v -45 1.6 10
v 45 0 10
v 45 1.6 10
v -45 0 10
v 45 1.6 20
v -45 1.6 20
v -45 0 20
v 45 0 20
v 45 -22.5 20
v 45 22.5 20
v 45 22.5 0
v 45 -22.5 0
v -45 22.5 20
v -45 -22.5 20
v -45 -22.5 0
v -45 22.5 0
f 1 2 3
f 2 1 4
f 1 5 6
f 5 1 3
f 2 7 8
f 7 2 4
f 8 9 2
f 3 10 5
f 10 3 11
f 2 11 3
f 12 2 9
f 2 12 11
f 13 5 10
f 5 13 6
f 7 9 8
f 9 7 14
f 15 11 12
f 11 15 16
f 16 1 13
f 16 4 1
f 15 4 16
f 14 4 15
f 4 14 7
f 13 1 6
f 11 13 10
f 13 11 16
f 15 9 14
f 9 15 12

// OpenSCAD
// Microscope slide drying rack
// Print orientation: base block on XY plane, slots open upward (+Z)

// ---------------- Parameters ----------------
block_len    = 90;    // base block length along X (mm)
block_wid    = 45;    // base block width along Y (mm)
block_h      = 20;    // base block height along Z (mm)

slot_count   = 10;    // number of microscope slide slots
slot_len     = 77;    // slot length along X (mm)
slot_w       = 1.6;   // slot width along Y (mm)
slot_depth   = 10;    // slot depth into block from top face (mm)
slot_pitch   = 3.5;   // centre-to-centre slot spacing along Y (mm)

eps          = 0.5;   // overshoot so cutters pass cleanly through the top face (mm)

$fn = 64;

// ---------------- Model ----------------
difference() {
    // Solid base block, centred in X and Y, sitting on z = 0
    translate([-block_len / 2, -block_wid / 2, 0])
        cube([block_len, block_wid, block_h]);

    // Parallel slots running along X, centred as a group in X and Y
    for (i = [0 : slot_count - 1]) {
        x = (i - (slot_count - 1) / 2) * slot_pitch;
        translate([x - slot_len / 2, 0, block_h - slot_depth])
            cube([slot_len, slot_w, slot_depth + eps]);
    }
}
